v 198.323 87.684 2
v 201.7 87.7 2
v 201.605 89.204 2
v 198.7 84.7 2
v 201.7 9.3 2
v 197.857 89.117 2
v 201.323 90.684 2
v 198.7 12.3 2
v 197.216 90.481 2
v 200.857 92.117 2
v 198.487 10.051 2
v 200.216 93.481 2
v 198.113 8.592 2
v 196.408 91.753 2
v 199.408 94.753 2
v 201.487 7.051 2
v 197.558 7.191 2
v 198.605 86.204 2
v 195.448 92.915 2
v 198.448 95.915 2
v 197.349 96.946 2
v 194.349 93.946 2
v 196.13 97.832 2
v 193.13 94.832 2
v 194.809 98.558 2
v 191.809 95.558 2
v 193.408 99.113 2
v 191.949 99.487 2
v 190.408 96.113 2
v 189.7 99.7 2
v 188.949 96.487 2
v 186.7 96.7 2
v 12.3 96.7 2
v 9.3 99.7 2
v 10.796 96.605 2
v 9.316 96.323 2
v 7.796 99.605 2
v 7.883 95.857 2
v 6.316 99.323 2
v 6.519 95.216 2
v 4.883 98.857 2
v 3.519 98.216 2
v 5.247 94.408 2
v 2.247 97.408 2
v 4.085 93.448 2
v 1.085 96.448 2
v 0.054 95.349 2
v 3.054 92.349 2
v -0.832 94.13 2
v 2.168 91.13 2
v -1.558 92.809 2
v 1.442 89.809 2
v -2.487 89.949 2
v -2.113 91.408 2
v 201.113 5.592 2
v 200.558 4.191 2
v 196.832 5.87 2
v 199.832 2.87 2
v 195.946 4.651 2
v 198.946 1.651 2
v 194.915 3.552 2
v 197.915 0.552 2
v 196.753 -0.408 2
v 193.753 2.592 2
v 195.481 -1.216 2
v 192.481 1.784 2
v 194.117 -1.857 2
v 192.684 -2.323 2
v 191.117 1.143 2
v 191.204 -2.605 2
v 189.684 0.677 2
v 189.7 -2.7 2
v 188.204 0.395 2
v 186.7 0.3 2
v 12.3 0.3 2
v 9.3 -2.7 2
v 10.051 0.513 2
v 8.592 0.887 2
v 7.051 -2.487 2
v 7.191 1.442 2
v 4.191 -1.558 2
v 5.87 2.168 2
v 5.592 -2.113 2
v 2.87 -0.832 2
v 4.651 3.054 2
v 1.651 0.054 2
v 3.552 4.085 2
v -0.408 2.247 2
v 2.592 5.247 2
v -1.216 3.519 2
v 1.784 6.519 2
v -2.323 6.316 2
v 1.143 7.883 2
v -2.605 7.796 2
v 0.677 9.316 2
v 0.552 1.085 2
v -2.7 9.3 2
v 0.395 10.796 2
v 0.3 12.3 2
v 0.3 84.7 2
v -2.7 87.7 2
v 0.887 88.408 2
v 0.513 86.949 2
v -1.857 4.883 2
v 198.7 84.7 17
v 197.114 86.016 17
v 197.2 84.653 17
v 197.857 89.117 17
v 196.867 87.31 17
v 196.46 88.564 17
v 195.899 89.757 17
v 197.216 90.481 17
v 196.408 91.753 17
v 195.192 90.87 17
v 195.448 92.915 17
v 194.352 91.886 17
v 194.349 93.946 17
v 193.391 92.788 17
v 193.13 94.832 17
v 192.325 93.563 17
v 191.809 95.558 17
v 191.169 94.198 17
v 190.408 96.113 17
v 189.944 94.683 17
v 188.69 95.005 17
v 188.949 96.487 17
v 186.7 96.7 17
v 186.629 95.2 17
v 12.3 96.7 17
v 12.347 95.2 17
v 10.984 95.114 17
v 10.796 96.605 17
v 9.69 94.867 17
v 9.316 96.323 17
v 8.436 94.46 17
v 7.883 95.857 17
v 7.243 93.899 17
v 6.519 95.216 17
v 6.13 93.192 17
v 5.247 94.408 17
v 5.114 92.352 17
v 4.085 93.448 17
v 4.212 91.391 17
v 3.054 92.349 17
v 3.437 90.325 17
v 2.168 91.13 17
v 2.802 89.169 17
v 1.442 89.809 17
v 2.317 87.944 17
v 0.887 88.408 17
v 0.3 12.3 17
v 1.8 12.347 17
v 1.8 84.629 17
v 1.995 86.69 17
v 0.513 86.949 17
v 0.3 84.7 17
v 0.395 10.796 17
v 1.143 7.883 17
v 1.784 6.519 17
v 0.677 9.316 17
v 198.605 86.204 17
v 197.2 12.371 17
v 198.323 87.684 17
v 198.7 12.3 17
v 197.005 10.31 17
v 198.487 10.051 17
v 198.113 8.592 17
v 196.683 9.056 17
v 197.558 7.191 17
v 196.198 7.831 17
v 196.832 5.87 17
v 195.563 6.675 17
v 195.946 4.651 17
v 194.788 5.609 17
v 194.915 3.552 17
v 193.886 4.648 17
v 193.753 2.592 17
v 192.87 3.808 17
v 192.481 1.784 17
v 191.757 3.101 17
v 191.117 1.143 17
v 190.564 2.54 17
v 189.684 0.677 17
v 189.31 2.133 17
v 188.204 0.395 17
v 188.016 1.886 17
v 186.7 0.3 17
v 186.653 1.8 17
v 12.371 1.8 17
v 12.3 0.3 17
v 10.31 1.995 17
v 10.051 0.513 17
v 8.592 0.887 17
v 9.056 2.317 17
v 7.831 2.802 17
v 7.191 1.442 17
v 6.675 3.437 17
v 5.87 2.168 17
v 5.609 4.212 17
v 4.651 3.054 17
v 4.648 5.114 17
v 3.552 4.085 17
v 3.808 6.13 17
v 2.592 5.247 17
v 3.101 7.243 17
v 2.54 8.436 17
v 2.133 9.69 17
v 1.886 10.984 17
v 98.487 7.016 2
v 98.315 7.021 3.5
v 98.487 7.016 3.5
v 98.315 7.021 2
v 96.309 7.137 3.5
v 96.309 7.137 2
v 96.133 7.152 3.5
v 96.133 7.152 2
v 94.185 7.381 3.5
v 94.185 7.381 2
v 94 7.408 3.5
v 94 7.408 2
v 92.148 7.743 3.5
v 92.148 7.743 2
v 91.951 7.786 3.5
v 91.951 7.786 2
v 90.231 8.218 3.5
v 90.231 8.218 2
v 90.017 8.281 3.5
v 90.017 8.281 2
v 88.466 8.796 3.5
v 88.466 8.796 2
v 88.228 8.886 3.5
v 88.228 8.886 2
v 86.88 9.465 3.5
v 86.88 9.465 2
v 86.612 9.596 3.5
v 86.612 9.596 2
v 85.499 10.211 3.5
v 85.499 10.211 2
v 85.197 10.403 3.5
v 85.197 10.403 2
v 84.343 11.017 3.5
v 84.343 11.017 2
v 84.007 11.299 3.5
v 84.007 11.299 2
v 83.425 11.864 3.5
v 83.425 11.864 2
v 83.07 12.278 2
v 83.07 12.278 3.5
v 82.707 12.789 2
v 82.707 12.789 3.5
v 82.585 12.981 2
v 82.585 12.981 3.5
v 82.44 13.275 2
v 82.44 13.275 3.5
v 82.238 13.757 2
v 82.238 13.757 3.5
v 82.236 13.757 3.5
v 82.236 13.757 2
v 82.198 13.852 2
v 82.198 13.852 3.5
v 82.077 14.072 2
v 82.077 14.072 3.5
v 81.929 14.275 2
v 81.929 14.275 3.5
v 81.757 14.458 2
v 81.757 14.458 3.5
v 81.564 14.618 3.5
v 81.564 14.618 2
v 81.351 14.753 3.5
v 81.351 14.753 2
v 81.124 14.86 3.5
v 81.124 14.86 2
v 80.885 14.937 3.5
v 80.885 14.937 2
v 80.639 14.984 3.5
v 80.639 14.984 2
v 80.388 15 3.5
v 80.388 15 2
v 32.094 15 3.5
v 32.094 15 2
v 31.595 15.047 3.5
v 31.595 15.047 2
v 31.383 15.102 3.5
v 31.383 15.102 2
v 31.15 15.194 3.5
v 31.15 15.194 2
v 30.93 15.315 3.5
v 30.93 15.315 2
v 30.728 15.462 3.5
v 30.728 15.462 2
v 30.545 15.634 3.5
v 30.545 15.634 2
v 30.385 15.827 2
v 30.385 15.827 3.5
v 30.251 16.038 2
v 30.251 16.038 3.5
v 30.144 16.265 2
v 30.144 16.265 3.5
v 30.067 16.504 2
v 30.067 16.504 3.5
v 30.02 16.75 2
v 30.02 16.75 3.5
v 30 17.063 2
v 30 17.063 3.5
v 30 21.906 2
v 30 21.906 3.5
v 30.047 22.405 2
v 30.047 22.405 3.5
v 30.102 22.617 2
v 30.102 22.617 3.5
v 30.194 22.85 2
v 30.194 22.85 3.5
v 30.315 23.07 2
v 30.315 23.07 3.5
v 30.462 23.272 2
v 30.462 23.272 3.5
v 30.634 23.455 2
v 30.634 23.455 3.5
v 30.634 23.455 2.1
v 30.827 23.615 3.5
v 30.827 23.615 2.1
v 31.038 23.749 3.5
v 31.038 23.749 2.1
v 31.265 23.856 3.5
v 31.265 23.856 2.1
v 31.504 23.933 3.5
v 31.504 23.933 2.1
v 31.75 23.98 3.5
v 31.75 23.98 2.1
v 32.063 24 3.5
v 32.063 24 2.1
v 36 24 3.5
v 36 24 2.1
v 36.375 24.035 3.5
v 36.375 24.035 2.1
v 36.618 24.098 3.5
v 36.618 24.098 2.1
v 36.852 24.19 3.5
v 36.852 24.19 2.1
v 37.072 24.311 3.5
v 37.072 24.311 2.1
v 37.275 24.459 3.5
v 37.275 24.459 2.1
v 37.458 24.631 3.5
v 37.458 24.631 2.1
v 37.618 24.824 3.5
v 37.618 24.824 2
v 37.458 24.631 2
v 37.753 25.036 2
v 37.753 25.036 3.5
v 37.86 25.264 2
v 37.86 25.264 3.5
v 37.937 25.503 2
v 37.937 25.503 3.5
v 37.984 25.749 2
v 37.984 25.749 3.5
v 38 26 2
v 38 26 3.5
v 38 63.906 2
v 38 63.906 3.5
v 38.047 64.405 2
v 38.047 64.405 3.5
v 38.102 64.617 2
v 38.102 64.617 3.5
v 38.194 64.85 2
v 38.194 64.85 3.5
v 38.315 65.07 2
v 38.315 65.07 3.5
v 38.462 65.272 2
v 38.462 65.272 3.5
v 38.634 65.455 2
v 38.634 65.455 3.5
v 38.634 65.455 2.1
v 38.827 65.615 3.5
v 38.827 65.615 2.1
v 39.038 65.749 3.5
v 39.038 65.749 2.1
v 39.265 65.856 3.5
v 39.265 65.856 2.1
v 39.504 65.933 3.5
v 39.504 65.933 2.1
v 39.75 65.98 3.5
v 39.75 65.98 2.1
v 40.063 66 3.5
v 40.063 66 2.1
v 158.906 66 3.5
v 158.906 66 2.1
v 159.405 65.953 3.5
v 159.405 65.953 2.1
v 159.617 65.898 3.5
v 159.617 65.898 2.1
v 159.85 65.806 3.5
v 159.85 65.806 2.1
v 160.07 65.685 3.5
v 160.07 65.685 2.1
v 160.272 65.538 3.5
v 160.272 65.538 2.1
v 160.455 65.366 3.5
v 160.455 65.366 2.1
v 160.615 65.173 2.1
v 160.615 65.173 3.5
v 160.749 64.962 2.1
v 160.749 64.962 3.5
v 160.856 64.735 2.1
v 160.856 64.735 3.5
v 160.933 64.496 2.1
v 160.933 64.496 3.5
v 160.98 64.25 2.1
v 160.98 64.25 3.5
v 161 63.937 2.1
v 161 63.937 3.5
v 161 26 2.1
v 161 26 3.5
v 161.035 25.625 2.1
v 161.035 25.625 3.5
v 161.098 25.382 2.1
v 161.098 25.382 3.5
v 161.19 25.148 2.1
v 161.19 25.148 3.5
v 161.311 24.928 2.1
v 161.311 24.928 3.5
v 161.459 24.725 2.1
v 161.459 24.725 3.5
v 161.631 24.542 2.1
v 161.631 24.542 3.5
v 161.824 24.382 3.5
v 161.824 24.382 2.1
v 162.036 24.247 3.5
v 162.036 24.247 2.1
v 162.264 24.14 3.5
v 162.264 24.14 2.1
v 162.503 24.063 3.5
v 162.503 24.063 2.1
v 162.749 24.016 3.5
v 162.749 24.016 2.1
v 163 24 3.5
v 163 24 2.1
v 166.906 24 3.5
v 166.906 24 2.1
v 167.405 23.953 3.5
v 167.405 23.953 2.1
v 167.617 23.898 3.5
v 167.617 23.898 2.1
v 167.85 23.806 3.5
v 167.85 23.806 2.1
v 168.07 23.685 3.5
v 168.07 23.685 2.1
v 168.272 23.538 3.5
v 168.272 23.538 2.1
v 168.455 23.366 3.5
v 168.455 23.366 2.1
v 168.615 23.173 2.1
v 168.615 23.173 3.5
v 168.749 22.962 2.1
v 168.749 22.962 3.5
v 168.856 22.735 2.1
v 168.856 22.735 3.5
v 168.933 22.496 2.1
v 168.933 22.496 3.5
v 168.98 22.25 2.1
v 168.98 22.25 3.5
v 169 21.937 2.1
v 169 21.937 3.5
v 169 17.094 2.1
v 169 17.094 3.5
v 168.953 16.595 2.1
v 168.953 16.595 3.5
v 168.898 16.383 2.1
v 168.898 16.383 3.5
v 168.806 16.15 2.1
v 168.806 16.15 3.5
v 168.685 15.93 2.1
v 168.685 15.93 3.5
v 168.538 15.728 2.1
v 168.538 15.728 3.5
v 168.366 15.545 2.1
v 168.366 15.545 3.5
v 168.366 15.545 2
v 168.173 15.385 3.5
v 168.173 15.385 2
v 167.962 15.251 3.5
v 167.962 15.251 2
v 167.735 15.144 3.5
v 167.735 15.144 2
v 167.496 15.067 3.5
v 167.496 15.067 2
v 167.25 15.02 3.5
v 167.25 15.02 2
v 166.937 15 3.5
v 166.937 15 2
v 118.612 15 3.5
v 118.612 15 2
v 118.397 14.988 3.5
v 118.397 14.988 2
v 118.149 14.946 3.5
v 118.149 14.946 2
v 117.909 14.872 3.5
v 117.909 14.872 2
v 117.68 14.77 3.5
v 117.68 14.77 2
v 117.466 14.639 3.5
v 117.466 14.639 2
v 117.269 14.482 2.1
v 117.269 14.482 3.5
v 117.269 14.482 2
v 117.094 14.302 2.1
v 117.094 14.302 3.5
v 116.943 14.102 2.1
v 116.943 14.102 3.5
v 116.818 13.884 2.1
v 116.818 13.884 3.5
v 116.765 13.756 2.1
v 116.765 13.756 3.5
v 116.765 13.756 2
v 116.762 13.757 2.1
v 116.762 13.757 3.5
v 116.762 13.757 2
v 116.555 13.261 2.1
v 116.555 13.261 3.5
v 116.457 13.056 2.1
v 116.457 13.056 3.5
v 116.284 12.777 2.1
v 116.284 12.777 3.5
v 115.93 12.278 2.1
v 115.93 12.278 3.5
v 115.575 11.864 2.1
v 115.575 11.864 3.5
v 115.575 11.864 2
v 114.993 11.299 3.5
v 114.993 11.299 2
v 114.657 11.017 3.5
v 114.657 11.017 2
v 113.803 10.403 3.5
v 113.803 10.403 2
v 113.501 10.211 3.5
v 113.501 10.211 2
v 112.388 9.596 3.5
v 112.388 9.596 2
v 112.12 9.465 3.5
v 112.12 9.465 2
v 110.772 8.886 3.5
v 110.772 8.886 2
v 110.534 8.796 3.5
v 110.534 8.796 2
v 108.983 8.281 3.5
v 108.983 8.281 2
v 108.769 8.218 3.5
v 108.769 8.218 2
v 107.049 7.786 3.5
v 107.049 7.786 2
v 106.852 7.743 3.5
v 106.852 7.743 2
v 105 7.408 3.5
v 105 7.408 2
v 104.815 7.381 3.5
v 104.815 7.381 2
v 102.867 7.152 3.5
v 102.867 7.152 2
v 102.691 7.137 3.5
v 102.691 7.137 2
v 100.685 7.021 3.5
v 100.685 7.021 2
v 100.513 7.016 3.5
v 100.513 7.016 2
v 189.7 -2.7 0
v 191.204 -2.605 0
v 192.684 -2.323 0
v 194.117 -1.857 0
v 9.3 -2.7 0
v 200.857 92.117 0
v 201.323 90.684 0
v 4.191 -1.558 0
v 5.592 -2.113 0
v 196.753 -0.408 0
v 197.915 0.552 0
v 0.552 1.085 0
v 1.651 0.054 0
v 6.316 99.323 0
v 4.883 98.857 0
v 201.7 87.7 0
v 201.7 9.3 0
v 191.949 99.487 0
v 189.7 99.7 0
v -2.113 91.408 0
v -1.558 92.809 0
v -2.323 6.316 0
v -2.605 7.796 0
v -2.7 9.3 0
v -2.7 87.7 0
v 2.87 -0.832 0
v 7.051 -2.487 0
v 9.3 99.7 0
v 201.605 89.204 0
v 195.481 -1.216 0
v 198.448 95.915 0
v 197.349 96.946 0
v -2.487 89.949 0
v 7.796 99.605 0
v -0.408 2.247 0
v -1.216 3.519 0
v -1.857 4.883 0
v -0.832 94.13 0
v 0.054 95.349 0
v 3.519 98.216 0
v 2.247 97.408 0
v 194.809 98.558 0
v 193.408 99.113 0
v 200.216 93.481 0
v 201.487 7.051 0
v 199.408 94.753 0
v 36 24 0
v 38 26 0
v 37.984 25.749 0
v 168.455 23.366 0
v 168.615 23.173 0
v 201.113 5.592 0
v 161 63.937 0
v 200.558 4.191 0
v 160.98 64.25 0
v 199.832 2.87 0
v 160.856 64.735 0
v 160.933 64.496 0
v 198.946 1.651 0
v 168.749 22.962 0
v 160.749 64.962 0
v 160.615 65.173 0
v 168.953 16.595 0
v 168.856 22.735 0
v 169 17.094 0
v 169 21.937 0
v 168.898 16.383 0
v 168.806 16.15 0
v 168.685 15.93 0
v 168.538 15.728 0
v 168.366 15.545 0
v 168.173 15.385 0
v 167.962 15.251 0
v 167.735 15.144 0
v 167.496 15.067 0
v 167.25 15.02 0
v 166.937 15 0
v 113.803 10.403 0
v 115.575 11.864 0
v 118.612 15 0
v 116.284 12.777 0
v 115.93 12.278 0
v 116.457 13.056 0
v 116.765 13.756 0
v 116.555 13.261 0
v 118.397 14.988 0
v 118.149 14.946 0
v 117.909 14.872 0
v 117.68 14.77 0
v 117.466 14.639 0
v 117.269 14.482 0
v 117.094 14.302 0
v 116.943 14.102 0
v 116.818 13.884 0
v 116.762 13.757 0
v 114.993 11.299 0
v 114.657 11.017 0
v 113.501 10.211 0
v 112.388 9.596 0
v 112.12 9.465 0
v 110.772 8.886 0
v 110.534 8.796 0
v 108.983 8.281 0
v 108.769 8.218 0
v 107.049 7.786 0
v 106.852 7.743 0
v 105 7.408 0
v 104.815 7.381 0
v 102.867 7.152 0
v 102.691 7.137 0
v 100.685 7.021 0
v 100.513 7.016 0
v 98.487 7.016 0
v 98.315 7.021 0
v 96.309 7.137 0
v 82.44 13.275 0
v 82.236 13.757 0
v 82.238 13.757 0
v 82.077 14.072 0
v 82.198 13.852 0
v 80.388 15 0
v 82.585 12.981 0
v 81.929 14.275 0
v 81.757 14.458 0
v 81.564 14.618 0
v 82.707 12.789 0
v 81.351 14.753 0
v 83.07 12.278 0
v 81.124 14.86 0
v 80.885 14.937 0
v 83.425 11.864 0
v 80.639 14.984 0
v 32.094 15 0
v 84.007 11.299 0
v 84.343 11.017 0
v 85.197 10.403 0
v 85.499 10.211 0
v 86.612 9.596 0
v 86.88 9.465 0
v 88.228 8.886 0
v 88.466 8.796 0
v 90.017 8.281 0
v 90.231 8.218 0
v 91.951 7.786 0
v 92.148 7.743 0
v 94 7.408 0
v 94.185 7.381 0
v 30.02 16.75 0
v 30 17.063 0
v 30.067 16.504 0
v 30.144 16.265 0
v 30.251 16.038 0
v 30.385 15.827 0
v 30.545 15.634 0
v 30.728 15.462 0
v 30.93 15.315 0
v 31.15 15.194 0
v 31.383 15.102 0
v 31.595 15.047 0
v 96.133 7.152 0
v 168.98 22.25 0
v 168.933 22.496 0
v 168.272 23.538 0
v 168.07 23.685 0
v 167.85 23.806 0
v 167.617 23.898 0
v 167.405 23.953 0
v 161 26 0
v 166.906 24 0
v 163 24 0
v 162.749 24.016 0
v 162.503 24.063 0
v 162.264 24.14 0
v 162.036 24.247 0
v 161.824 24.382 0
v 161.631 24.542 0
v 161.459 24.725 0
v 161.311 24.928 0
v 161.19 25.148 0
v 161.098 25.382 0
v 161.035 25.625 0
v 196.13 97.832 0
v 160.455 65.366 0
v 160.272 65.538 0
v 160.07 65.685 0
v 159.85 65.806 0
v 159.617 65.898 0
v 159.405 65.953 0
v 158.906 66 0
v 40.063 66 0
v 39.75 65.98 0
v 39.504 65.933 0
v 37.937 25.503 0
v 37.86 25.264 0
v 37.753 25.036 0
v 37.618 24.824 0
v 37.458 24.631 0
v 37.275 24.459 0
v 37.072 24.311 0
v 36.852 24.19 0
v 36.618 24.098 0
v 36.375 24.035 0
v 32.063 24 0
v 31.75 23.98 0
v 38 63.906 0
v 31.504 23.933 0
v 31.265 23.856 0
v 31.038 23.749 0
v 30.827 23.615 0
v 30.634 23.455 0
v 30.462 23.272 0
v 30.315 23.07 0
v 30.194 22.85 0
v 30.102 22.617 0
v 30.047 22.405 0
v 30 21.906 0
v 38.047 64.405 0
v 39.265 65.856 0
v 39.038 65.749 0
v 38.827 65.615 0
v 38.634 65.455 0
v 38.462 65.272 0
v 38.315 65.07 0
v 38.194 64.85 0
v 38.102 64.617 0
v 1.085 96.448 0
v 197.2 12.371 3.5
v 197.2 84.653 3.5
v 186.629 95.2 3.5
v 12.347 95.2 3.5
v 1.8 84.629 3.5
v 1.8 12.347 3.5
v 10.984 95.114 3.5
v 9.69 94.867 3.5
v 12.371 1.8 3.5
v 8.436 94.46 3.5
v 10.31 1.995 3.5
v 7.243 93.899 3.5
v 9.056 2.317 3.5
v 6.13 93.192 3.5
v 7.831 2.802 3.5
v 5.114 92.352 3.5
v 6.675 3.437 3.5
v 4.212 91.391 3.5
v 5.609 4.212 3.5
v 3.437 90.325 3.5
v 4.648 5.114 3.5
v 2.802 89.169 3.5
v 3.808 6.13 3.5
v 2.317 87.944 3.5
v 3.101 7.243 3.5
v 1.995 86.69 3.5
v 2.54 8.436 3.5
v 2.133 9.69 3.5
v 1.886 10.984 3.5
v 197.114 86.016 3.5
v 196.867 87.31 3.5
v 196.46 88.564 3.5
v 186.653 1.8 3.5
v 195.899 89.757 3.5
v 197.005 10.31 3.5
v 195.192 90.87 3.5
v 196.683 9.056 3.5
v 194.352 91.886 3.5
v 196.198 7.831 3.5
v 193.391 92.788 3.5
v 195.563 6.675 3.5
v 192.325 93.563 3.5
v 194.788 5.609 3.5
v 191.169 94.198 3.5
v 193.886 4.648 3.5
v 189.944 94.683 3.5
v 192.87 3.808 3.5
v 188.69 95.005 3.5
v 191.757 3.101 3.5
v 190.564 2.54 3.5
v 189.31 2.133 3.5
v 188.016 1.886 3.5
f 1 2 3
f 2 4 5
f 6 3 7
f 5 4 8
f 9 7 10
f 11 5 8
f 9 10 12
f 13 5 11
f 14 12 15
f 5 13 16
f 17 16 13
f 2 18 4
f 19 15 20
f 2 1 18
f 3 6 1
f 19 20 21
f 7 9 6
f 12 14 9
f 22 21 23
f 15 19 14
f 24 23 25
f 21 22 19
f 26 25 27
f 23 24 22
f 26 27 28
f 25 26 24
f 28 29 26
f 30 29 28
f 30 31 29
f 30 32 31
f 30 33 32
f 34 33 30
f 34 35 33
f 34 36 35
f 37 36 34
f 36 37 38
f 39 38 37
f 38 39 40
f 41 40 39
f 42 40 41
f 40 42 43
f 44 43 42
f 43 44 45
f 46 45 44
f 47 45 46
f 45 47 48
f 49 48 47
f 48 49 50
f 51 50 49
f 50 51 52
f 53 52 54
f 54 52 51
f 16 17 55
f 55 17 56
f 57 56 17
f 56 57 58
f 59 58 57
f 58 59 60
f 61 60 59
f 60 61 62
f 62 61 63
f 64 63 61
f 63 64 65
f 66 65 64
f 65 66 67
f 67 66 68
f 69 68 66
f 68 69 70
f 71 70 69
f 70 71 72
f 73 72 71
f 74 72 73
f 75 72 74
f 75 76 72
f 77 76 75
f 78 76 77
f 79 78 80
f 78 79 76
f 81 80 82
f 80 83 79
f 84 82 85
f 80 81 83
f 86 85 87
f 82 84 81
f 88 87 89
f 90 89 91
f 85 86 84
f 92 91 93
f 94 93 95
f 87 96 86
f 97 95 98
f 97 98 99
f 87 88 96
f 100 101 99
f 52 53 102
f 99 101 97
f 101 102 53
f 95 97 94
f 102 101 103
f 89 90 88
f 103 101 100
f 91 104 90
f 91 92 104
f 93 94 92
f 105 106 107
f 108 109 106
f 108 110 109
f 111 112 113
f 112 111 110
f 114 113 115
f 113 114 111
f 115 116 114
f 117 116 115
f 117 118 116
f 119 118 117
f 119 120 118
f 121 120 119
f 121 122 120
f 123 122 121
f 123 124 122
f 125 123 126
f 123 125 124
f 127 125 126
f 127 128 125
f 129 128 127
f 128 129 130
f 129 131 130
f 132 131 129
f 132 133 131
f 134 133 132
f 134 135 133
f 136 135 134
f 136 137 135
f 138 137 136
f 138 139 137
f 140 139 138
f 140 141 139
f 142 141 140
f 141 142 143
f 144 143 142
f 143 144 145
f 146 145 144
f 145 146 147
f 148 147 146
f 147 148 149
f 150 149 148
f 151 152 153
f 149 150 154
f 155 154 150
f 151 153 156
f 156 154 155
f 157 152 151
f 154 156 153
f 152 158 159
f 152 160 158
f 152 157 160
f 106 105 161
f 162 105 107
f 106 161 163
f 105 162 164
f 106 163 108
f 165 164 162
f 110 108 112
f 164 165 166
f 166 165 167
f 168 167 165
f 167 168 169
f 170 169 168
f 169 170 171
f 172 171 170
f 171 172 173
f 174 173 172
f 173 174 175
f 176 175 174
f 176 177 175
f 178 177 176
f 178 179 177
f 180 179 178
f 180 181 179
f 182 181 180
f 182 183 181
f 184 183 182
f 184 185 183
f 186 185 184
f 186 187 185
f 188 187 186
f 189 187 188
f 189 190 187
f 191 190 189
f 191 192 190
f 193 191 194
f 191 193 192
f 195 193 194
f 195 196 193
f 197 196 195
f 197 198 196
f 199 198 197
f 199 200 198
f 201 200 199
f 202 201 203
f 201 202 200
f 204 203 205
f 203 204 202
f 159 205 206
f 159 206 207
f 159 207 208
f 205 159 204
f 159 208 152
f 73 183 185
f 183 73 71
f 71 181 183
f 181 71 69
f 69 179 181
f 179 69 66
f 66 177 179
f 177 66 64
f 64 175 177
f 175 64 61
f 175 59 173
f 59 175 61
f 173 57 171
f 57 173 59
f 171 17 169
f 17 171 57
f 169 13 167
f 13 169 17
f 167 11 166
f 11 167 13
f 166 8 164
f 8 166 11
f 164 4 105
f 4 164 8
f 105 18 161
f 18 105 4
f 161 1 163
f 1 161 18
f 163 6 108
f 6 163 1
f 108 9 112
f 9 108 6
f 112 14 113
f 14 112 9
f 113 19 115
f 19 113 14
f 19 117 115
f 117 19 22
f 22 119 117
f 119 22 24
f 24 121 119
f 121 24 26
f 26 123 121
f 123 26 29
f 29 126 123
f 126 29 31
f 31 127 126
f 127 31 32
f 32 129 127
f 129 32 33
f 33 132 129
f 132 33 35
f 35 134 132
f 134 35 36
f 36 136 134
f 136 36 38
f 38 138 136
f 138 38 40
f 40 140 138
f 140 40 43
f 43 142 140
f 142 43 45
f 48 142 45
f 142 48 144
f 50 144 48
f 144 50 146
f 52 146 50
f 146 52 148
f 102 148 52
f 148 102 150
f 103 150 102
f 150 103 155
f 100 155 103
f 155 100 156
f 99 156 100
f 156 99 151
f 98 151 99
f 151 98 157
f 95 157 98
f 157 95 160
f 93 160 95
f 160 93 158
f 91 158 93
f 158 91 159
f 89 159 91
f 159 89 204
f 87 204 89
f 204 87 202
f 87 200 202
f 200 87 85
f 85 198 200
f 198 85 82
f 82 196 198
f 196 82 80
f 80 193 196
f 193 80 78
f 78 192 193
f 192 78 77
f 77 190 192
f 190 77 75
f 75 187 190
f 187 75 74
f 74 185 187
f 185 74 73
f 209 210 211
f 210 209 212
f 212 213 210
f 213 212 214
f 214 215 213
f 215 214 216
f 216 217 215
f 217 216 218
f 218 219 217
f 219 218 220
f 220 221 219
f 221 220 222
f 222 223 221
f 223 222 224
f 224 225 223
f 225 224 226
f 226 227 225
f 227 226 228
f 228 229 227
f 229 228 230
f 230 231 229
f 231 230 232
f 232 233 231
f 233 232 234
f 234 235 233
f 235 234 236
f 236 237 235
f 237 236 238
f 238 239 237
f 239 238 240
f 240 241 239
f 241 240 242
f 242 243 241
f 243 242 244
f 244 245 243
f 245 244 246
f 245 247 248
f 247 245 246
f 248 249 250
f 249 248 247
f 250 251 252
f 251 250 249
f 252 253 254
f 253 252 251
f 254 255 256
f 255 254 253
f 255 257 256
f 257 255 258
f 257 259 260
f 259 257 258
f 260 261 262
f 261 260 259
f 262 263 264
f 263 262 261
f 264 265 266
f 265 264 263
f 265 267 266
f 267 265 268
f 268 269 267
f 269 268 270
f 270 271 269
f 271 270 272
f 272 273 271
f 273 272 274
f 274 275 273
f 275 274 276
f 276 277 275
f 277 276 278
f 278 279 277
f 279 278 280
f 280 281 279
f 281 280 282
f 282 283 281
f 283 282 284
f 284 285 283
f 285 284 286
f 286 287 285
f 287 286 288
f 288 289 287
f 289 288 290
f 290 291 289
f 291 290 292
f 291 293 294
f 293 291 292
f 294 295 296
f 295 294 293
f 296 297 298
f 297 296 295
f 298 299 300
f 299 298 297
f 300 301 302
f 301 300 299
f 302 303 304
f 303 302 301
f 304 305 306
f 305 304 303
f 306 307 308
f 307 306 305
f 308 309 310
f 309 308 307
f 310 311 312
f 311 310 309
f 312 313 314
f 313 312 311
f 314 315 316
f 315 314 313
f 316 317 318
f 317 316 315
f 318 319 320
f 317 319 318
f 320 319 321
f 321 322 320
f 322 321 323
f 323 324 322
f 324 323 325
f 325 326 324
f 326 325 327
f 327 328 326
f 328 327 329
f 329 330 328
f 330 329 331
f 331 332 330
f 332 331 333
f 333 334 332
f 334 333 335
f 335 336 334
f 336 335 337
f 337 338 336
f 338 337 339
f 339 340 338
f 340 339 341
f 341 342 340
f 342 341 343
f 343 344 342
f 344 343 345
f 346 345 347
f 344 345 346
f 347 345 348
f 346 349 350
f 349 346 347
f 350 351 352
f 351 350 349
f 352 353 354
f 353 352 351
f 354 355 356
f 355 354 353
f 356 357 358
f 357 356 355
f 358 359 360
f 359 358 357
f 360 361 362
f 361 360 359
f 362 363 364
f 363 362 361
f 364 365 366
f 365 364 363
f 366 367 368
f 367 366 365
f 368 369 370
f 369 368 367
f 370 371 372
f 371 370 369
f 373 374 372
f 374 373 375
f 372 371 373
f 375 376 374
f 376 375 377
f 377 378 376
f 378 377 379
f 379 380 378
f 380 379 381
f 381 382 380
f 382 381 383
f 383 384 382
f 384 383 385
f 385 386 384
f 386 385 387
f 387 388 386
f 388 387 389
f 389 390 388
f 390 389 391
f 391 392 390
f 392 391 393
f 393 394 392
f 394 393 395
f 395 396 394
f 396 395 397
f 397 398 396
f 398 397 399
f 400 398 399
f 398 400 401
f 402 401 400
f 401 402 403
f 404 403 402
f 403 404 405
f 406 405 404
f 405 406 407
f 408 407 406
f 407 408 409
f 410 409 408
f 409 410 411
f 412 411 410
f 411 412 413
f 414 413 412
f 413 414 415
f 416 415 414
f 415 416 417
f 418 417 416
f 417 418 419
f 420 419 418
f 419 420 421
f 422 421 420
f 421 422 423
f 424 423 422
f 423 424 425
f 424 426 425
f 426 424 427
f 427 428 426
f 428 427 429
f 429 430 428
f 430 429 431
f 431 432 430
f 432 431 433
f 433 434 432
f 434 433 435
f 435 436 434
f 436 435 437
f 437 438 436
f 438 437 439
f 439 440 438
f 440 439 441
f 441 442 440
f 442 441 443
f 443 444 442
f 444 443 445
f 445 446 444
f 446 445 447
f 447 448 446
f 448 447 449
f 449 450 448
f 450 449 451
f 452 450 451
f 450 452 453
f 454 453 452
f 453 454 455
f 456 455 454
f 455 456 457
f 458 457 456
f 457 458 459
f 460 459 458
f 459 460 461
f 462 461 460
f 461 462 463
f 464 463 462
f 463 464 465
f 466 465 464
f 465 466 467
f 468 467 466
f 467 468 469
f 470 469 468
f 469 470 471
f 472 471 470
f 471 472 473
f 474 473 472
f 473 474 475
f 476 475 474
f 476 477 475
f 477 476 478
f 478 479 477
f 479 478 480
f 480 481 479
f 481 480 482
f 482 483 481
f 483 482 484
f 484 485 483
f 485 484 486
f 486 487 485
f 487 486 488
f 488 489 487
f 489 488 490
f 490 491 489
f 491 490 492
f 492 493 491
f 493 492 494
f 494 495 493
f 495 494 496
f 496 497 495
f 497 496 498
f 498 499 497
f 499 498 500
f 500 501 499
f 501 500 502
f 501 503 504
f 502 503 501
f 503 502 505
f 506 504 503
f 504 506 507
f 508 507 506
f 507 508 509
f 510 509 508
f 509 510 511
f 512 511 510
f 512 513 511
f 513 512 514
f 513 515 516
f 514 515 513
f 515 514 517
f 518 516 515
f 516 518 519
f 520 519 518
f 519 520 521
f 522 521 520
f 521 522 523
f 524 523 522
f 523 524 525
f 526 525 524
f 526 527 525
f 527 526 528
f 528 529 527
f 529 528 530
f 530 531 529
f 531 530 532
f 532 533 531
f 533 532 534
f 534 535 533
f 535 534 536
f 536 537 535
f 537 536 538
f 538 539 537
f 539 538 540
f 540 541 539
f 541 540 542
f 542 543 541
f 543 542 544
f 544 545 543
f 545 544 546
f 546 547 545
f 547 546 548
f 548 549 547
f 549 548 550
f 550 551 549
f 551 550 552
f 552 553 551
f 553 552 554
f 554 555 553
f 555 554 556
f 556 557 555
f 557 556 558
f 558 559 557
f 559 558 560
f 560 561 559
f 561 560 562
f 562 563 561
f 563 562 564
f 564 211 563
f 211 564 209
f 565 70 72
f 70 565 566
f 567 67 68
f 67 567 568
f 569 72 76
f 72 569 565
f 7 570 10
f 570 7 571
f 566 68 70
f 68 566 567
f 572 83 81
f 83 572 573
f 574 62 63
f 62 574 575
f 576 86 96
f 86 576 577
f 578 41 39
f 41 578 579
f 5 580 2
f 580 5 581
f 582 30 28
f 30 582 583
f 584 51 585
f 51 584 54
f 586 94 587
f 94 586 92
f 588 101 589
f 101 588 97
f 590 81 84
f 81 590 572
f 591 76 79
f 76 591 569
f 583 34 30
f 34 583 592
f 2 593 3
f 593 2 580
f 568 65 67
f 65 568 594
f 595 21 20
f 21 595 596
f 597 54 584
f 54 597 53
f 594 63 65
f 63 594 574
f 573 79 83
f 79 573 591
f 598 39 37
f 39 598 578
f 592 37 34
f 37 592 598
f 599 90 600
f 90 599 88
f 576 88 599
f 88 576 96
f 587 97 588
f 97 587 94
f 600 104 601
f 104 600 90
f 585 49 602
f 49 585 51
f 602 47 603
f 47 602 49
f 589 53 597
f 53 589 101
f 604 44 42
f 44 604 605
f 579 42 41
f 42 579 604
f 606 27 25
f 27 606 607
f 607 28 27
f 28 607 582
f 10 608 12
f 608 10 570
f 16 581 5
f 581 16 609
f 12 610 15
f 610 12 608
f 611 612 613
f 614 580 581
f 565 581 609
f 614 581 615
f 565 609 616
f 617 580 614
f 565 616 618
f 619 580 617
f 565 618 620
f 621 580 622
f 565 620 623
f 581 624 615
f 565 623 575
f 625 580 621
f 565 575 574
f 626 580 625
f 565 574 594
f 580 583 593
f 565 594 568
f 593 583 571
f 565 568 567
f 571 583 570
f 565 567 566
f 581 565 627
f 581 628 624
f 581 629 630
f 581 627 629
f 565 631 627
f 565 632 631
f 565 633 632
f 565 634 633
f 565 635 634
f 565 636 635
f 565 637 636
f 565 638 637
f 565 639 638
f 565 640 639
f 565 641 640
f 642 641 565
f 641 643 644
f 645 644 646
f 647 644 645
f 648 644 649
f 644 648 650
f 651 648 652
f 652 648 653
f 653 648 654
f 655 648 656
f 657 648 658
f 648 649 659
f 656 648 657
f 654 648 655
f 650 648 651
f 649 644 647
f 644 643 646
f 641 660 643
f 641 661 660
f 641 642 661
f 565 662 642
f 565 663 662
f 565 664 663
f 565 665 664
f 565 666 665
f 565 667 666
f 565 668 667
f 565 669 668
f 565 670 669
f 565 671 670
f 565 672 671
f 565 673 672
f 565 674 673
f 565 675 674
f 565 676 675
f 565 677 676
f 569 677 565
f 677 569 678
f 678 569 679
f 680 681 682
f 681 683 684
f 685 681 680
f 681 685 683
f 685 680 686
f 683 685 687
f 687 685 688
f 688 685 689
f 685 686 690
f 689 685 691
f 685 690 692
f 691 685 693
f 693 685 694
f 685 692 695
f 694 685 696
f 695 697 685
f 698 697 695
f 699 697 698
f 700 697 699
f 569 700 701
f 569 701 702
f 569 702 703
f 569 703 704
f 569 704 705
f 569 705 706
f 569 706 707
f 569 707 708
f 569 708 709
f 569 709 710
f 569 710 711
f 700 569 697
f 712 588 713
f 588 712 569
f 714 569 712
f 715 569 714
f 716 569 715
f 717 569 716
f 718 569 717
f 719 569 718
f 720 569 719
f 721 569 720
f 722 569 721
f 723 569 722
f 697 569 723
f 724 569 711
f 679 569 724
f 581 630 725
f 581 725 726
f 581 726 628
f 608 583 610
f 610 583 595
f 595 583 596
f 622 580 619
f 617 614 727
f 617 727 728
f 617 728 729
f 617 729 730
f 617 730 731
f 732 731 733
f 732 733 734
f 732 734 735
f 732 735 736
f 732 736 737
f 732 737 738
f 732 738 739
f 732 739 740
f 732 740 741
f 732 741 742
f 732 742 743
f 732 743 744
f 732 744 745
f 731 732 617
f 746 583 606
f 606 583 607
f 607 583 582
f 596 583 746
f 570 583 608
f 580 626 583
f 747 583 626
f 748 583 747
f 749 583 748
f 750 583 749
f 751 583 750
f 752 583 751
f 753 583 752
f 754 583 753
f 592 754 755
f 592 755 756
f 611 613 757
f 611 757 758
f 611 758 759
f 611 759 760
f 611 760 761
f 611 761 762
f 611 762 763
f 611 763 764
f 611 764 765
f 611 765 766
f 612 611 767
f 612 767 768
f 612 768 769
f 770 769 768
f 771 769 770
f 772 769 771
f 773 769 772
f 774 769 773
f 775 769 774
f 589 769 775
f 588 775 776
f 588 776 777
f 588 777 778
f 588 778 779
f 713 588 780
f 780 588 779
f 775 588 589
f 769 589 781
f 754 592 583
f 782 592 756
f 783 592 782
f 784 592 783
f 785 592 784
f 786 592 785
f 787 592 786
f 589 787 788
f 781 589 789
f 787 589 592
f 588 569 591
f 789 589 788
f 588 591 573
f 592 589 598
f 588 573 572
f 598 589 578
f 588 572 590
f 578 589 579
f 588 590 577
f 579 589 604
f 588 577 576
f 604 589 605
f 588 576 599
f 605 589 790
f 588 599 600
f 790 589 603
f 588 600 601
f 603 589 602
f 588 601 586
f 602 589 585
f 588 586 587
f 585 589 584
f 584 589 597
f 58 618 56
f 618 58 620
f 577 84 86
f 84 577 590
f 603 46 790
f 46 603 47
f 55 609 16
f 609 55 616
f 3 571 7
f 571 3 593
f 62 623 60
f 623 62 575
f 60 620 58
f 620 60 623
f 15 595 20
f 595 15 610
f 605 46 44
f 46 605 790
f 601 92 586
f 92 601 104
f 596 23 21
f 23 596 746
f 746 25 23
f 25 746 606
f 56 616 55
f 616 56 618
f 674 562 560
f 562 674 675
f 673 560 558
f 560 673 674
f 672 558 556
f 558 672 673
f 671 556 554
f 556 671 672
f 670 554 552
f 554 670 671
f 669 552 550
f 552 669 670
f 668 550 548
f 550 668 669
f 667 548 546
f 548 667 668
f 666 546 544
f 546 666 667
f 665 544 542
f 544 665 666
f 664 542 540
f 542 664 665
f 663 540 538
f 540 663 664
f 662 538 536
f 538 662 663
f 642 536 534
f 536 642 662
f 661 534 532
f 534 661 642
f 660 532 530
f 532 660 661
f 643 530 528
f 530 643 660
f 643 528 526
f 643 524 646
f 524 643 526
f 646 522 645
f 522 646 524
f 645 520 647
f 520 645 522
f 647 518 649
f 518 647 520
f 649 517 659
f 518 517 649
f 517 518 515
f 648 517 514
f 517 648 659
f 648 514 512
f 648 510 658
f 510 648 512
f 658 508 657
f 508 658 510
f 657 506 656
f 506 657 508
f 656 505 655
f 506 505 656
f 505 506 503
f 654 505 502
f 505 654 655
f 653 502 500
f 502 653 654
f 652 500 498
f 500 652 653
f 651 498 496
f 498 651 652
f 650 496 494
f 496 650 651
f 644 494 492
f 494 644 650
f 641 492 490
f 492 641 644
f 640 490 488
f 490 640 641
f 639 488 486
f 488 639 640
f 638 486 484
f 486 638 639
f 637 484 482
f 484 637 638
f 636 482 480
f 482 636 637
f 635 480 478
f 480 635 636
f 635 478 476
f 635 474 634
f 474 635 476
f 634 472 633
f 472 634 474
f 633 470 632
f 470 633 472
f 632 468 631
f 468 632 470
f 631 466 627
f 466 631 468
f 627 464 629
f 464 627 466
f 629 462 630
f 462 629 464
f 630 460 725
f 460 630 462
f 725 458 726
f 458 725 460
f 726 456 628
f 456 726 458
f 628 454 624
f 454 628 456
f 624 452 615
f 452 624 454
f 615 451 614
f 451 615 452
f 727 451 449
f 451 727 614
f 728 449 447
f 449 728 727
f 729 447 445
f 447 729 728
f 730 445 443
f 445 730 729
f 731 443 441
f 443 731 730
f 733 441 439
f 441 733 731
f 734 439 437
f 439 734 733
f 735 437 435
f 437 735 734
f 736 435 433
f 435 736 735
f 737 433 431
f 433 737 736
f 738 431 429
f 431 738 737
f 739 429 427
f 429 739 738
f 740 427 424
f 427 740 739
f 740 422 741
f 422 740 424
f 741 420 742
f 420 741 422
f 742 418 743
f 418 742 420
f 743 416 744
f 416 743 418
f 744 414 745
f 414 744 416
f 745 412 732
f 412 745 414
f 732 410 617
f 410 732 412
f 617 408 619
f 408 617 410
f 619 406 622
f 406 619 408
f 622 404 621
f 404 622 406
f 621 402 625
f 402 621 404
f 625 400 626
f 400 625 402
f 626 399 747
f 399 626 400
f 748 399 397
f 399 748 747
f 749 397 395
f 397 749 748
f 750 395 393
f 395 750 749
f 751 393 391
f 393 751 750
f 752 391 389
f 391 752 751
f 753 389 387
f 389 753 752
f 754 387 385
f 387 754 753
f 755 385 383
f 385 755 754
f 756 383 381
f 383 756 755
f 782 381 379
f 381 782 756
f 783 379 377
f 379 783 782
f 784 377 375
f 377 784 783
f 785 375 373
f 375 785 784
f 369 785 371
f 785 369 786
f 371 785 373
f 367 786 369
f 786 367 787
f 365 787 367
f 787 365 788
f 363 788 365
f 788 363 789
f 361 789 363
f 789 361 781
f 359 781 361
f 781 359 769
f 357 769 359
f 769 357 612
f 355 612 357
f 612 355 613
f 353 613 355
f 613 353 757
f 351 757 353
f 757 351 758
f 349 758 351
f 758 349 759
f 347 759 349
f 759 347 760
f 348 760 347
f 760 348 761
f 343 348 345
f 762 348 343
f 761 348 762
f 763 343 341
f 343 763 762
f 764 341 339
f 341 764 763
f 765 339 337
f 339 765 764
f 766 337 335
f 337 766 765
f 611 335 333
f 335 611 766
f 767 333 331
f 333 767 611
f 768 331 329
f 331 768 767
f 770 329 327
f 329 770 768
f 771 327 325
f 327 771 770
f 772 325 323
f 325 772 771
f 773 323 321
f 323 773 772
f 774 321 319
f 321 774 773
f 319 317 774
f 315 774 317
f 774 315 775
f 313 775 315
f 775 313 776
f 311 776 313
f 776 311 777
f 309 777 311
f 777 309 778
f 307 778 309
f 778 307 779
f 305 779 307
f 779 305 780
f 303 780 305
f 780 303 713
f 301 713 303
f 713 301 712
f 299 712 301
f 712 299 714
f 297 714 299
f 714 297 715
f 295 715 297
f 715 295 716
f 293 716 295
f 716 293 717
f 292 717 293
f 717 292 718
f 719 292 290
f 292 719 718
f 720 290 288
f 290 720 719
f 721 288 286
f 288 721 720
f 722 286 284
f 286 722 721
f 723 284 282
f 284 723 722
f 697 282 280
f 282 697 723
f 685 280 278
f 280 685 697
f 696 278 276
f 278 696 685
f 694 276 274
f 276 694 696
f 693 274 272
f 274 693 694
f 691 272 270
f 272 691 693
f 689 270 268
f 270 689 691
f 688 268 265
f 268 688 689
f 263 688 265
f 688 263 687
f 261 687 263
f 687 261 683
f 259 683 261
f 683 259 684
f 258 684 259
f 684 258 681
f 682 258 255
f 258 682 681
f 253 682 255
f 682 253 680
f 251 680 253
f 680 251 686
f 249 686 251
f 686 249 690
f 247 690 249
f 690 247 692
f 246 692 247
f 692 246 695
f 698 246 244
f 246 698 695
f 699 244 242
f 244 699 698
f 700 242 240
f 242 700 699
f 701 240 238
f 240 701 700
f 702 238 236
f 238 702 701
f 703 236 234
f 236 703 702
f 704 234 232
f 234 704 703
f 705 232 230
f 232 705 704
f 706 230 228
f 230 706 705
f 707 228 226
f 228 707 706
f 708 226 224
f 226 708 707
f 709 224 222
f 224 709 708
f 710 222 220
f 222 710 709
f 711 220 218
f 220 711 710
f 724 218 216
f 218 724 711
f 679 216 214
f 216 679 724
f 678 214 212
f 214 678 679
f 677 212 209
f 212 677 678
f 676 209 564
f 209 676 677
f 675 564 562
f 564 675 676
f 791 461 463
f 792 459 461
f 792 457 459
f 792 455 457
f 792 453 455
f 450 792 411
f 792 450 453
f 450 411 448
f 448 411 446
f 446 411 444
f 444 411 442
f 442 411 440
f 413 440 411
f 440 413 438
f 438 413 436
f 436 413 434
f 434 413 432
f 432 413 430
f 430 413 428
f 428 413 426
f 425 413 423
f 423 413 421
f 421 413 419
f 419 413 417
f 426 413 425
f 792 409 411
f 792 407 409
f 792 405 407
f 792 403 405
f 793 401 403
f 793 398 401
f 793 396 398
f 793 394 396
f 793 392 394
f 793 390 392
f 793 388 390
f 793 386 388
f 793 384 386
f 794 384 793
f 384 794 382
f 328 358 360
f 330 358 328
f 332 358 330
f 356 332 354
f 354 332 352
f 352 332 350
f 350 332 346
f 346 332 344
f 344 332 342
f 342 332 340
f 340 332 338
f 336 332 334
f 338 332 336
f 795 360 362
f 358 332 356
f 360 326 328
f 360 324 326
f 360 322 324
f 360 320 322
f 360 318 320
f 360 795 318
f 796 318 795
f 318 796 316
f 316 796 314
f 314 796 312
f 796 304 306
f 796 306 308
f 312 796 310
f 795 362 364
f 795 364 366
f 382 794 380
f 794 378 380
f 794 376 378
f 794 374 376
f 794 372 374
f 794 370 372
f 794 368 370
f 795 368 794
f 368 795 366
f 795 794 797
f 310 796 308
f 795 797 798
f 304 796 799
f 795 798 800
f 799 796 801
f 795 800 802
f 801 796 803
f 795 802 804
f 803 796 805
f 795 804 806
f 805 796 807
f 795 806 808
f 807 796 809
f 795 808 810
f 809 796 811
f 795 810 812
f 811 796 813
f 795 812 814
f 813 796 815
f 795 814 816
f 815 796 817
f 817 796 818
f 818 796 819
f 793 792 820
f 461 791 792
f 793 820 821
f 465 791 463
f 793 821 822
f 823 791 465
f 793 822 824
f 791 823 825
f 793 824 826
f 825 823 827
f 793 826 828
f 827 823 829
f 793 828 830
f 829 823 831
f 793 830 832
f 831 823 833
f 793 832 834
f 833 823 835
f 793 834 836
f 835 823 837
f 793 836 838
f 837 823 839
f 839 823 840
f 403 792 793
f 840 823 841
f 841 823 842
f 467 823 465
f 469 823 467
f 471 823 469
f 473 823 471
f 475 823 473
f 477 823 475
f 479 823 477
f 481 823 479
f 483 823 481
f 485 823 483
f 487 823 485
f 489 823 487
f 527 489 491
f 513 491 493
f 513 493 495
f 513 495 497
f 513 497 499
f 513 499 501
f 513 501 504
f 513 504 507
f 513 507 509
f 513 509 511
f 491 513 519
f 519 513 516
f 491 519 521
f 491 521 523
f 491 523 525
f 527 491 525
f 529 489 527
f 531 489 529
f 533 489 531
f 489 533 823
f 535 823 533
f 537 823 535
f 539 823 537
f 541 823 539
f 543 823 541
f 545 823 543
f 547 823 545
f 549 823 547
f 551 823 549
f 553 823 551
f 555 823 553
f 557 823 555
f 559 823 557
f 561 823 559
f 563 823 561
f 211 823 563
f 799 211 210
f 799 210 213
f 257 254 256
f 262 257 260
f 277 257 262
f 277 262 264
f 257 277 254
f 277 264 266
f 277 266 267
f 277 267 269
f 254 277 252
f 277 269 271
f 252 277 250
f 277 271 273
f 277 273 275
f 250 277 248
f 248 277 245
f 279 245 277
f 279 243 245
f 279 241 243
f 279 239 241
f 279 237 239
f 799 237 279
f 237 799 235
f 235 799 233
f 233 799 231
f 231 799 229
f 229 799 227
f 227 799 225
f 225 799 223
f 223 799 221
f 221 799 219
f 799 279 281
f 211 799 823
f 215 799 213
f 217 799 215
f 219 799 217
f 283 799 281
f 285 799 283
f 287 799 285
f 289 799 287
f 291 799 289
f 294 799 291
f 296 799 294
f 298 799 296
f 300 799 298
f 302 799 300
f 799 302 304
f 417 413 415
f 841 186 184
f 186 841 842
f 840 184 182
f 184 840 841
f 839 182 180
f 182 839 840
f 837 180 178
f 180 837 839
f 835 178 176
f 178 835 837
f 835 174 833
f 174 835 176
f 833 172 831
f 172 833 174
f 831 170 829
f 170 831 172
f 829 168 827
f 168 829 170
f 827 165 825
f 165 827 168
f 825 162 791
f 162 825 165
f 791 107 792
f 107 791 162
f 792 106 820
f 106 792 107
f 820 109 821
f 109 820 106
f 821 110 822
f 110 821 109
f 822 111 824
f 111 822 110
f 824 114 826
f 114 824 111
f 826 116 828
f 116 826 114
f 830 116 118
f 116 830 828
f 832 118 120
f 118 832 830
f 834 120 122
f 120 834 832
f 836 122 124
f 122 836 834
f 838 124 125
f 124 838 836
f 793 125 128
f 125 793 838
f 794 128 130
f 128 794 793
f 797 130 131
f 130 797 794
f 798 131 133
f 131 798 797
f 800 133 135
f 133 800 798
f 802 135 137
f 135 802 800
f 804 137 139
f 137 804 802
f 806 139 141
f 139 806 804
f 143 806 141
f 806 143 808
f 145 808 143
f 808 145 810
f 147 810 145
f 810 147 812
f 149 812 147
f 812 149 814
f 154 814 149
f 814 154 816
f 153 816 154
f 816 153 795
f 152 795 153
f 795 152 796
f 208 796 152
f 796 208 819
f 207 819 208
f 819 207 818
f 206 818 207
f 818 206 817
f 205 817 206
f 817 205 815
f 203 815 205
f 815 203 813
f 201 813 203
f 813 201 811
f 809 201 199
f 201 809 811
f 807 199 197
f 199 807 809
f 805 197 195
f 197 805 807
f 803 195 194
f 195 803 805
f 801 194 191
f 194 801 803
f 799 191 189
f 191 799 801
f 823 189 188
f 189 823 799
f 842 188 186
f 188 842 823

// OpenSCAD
// Prado 2018 Radio Trim — TEST FIT SHELL v3
// L-shaped cutout matching actual cage/bracket profile
//
// The gap around the Sony cage is L-shaped on each side:
//   38mm from opening edge to bracket (upper, most of height)
//   30mm from opening edge to bracket (lower, bottom 9mm)
//   Same both sides
//
// Cutout visible from front:
//   Upper: 199 - 38×2 = 123mm wide
//   Lower: 199 - 30×2 = 139mm wide (9mm tall)
//
// The L-shaped fill extends FULL DEPTH, not just flange face.
//
// Print: flange face DOWN on build plate
// 0.2mm layers, 2 perimeters, 10% infill, no supports

// ── Dimensions ───────────────────────────────────────────────

outer_w = 199;
outer_h = 97;
outer_r = 12;     // matches dash opening corners (~20 KES coin radius)

// L-shaped cutout (from opening edge to bracket, same both sides)
fill_upper = 38;    // wider gap (bracket stepped inward)
fill_lower = 30;    // narrower gap (bracket stepped outward)
step_h     = 9;     // height of the 30mm section (7mm + 2mm wiggle)
cutout_h   = 51;    // cage opening height
cutout_y   = 15;    // confirmed flush with Sony cage

// Derived cutout widths
cutout_upper_w = outer_w - fill_upper * 2;   // 123mm
cutout_lower_w = outer_w - fill_lower * 2;   // 139mm

depth           = 15;
flange_overhang = 3;
flange_t        = 2;
wall            = 1.5;
tol             = 0.3;

// Bolt arc groove on inner bottom edge of cutout
bolt_arc_w      = 35;    // groove width (3.5cm)
bolt_arc_depth  = 8;     // how far the arc dips into the 15mm strip (leaves 7mm)

$fn = 50;

// ── Modules ──────────────────────────────────────────────────

module rounded_rect_2d(w, h, r) {
    offset(r) offset(-r)
        square([w, h]);
}

// L-shaped cutout profile with bolt arc groove
cutout_r = 2;     // corner radius for cutout edges

module l_cutout_2d() {
    // Round both convex and concave corners: offset(-r), offset(2r), offset(-r)
    offset(r=-cutout_r) offset(r=2*cutout_r) offset(r=-cutout_r) {
        // Lower section (wider, 139mm, 9mm tall)
        translate([(outer_w - cutout_lower_w) / 2, cutout_y])
            square([cutout_lower_w, step_h]);

        // Upper section (narrower, 123mm, rest of height)
        translate([(outer_w - cutout_upper_w) / 2, cutout_y + step_h])
            square([cutout_upper_w, cutout_h - step_h]);

        // Bolt arc groove — shallow arc on inner bottom edge
        intersection() {
            translate([outer_w / 2, cutout_y])
                scale([1, bolt_arc_depth / (bolt_arc_w / 2)])
                    circle(d=bolt_arc_w);
            translate([(outer_w - bolt_arc_w) / 2, cutout_y - bolt_arc_depth])
                square([bolt_arc_w, bolt_arc_depth]);
        }
    }
}

// Body profile: outer rectangle minus L-cutout
module body_profile() {
    difference() {
        rounded_rect_2d(outer_w - tol*2, outer_h - tol*2, outer_r);
        translate([-tol, -tol])
            l_cutout_2d();
    }
}

// ── Test Fit Shell ───────────────────────────────────────────

module testfit() {
    difference() {
        union() {
            // Body shell (L-shaped cutout built into profile)
            translate([tol, tol, flange_t])
            linear_extrude(depth)
                body_profile();

            // Front flange
            translate([-(flange_overhang - tol), -(flange_overhang - tol), 0])
            linear_extrude(flange_t)
                rounded_rect_2d(
                    outer_w + flange_overhang*2 - tol*2,
                    outer_h + flange_overhang*2 - tol*2,
                    outer_r
                );
        }

        // L-cutout through flange too
        translate([0, 0, -1])
        linear_extrude(flange_t + 1.1)
            l_cutout_2d();

        // Hollow body interior (outer walls only, no ridge around cutout)
        translate([tol, tol, flange_t + wall])
        linear_extrude(depth + 1)
            difference() {
                offset(-wall)
                    rounded_rect_2d(outer_w - tol*2, outer_h - tol*2, outer_r);
                translate([-tol, -tol])
                    l_cutout_2d();
            }
    }
}

testfit();
